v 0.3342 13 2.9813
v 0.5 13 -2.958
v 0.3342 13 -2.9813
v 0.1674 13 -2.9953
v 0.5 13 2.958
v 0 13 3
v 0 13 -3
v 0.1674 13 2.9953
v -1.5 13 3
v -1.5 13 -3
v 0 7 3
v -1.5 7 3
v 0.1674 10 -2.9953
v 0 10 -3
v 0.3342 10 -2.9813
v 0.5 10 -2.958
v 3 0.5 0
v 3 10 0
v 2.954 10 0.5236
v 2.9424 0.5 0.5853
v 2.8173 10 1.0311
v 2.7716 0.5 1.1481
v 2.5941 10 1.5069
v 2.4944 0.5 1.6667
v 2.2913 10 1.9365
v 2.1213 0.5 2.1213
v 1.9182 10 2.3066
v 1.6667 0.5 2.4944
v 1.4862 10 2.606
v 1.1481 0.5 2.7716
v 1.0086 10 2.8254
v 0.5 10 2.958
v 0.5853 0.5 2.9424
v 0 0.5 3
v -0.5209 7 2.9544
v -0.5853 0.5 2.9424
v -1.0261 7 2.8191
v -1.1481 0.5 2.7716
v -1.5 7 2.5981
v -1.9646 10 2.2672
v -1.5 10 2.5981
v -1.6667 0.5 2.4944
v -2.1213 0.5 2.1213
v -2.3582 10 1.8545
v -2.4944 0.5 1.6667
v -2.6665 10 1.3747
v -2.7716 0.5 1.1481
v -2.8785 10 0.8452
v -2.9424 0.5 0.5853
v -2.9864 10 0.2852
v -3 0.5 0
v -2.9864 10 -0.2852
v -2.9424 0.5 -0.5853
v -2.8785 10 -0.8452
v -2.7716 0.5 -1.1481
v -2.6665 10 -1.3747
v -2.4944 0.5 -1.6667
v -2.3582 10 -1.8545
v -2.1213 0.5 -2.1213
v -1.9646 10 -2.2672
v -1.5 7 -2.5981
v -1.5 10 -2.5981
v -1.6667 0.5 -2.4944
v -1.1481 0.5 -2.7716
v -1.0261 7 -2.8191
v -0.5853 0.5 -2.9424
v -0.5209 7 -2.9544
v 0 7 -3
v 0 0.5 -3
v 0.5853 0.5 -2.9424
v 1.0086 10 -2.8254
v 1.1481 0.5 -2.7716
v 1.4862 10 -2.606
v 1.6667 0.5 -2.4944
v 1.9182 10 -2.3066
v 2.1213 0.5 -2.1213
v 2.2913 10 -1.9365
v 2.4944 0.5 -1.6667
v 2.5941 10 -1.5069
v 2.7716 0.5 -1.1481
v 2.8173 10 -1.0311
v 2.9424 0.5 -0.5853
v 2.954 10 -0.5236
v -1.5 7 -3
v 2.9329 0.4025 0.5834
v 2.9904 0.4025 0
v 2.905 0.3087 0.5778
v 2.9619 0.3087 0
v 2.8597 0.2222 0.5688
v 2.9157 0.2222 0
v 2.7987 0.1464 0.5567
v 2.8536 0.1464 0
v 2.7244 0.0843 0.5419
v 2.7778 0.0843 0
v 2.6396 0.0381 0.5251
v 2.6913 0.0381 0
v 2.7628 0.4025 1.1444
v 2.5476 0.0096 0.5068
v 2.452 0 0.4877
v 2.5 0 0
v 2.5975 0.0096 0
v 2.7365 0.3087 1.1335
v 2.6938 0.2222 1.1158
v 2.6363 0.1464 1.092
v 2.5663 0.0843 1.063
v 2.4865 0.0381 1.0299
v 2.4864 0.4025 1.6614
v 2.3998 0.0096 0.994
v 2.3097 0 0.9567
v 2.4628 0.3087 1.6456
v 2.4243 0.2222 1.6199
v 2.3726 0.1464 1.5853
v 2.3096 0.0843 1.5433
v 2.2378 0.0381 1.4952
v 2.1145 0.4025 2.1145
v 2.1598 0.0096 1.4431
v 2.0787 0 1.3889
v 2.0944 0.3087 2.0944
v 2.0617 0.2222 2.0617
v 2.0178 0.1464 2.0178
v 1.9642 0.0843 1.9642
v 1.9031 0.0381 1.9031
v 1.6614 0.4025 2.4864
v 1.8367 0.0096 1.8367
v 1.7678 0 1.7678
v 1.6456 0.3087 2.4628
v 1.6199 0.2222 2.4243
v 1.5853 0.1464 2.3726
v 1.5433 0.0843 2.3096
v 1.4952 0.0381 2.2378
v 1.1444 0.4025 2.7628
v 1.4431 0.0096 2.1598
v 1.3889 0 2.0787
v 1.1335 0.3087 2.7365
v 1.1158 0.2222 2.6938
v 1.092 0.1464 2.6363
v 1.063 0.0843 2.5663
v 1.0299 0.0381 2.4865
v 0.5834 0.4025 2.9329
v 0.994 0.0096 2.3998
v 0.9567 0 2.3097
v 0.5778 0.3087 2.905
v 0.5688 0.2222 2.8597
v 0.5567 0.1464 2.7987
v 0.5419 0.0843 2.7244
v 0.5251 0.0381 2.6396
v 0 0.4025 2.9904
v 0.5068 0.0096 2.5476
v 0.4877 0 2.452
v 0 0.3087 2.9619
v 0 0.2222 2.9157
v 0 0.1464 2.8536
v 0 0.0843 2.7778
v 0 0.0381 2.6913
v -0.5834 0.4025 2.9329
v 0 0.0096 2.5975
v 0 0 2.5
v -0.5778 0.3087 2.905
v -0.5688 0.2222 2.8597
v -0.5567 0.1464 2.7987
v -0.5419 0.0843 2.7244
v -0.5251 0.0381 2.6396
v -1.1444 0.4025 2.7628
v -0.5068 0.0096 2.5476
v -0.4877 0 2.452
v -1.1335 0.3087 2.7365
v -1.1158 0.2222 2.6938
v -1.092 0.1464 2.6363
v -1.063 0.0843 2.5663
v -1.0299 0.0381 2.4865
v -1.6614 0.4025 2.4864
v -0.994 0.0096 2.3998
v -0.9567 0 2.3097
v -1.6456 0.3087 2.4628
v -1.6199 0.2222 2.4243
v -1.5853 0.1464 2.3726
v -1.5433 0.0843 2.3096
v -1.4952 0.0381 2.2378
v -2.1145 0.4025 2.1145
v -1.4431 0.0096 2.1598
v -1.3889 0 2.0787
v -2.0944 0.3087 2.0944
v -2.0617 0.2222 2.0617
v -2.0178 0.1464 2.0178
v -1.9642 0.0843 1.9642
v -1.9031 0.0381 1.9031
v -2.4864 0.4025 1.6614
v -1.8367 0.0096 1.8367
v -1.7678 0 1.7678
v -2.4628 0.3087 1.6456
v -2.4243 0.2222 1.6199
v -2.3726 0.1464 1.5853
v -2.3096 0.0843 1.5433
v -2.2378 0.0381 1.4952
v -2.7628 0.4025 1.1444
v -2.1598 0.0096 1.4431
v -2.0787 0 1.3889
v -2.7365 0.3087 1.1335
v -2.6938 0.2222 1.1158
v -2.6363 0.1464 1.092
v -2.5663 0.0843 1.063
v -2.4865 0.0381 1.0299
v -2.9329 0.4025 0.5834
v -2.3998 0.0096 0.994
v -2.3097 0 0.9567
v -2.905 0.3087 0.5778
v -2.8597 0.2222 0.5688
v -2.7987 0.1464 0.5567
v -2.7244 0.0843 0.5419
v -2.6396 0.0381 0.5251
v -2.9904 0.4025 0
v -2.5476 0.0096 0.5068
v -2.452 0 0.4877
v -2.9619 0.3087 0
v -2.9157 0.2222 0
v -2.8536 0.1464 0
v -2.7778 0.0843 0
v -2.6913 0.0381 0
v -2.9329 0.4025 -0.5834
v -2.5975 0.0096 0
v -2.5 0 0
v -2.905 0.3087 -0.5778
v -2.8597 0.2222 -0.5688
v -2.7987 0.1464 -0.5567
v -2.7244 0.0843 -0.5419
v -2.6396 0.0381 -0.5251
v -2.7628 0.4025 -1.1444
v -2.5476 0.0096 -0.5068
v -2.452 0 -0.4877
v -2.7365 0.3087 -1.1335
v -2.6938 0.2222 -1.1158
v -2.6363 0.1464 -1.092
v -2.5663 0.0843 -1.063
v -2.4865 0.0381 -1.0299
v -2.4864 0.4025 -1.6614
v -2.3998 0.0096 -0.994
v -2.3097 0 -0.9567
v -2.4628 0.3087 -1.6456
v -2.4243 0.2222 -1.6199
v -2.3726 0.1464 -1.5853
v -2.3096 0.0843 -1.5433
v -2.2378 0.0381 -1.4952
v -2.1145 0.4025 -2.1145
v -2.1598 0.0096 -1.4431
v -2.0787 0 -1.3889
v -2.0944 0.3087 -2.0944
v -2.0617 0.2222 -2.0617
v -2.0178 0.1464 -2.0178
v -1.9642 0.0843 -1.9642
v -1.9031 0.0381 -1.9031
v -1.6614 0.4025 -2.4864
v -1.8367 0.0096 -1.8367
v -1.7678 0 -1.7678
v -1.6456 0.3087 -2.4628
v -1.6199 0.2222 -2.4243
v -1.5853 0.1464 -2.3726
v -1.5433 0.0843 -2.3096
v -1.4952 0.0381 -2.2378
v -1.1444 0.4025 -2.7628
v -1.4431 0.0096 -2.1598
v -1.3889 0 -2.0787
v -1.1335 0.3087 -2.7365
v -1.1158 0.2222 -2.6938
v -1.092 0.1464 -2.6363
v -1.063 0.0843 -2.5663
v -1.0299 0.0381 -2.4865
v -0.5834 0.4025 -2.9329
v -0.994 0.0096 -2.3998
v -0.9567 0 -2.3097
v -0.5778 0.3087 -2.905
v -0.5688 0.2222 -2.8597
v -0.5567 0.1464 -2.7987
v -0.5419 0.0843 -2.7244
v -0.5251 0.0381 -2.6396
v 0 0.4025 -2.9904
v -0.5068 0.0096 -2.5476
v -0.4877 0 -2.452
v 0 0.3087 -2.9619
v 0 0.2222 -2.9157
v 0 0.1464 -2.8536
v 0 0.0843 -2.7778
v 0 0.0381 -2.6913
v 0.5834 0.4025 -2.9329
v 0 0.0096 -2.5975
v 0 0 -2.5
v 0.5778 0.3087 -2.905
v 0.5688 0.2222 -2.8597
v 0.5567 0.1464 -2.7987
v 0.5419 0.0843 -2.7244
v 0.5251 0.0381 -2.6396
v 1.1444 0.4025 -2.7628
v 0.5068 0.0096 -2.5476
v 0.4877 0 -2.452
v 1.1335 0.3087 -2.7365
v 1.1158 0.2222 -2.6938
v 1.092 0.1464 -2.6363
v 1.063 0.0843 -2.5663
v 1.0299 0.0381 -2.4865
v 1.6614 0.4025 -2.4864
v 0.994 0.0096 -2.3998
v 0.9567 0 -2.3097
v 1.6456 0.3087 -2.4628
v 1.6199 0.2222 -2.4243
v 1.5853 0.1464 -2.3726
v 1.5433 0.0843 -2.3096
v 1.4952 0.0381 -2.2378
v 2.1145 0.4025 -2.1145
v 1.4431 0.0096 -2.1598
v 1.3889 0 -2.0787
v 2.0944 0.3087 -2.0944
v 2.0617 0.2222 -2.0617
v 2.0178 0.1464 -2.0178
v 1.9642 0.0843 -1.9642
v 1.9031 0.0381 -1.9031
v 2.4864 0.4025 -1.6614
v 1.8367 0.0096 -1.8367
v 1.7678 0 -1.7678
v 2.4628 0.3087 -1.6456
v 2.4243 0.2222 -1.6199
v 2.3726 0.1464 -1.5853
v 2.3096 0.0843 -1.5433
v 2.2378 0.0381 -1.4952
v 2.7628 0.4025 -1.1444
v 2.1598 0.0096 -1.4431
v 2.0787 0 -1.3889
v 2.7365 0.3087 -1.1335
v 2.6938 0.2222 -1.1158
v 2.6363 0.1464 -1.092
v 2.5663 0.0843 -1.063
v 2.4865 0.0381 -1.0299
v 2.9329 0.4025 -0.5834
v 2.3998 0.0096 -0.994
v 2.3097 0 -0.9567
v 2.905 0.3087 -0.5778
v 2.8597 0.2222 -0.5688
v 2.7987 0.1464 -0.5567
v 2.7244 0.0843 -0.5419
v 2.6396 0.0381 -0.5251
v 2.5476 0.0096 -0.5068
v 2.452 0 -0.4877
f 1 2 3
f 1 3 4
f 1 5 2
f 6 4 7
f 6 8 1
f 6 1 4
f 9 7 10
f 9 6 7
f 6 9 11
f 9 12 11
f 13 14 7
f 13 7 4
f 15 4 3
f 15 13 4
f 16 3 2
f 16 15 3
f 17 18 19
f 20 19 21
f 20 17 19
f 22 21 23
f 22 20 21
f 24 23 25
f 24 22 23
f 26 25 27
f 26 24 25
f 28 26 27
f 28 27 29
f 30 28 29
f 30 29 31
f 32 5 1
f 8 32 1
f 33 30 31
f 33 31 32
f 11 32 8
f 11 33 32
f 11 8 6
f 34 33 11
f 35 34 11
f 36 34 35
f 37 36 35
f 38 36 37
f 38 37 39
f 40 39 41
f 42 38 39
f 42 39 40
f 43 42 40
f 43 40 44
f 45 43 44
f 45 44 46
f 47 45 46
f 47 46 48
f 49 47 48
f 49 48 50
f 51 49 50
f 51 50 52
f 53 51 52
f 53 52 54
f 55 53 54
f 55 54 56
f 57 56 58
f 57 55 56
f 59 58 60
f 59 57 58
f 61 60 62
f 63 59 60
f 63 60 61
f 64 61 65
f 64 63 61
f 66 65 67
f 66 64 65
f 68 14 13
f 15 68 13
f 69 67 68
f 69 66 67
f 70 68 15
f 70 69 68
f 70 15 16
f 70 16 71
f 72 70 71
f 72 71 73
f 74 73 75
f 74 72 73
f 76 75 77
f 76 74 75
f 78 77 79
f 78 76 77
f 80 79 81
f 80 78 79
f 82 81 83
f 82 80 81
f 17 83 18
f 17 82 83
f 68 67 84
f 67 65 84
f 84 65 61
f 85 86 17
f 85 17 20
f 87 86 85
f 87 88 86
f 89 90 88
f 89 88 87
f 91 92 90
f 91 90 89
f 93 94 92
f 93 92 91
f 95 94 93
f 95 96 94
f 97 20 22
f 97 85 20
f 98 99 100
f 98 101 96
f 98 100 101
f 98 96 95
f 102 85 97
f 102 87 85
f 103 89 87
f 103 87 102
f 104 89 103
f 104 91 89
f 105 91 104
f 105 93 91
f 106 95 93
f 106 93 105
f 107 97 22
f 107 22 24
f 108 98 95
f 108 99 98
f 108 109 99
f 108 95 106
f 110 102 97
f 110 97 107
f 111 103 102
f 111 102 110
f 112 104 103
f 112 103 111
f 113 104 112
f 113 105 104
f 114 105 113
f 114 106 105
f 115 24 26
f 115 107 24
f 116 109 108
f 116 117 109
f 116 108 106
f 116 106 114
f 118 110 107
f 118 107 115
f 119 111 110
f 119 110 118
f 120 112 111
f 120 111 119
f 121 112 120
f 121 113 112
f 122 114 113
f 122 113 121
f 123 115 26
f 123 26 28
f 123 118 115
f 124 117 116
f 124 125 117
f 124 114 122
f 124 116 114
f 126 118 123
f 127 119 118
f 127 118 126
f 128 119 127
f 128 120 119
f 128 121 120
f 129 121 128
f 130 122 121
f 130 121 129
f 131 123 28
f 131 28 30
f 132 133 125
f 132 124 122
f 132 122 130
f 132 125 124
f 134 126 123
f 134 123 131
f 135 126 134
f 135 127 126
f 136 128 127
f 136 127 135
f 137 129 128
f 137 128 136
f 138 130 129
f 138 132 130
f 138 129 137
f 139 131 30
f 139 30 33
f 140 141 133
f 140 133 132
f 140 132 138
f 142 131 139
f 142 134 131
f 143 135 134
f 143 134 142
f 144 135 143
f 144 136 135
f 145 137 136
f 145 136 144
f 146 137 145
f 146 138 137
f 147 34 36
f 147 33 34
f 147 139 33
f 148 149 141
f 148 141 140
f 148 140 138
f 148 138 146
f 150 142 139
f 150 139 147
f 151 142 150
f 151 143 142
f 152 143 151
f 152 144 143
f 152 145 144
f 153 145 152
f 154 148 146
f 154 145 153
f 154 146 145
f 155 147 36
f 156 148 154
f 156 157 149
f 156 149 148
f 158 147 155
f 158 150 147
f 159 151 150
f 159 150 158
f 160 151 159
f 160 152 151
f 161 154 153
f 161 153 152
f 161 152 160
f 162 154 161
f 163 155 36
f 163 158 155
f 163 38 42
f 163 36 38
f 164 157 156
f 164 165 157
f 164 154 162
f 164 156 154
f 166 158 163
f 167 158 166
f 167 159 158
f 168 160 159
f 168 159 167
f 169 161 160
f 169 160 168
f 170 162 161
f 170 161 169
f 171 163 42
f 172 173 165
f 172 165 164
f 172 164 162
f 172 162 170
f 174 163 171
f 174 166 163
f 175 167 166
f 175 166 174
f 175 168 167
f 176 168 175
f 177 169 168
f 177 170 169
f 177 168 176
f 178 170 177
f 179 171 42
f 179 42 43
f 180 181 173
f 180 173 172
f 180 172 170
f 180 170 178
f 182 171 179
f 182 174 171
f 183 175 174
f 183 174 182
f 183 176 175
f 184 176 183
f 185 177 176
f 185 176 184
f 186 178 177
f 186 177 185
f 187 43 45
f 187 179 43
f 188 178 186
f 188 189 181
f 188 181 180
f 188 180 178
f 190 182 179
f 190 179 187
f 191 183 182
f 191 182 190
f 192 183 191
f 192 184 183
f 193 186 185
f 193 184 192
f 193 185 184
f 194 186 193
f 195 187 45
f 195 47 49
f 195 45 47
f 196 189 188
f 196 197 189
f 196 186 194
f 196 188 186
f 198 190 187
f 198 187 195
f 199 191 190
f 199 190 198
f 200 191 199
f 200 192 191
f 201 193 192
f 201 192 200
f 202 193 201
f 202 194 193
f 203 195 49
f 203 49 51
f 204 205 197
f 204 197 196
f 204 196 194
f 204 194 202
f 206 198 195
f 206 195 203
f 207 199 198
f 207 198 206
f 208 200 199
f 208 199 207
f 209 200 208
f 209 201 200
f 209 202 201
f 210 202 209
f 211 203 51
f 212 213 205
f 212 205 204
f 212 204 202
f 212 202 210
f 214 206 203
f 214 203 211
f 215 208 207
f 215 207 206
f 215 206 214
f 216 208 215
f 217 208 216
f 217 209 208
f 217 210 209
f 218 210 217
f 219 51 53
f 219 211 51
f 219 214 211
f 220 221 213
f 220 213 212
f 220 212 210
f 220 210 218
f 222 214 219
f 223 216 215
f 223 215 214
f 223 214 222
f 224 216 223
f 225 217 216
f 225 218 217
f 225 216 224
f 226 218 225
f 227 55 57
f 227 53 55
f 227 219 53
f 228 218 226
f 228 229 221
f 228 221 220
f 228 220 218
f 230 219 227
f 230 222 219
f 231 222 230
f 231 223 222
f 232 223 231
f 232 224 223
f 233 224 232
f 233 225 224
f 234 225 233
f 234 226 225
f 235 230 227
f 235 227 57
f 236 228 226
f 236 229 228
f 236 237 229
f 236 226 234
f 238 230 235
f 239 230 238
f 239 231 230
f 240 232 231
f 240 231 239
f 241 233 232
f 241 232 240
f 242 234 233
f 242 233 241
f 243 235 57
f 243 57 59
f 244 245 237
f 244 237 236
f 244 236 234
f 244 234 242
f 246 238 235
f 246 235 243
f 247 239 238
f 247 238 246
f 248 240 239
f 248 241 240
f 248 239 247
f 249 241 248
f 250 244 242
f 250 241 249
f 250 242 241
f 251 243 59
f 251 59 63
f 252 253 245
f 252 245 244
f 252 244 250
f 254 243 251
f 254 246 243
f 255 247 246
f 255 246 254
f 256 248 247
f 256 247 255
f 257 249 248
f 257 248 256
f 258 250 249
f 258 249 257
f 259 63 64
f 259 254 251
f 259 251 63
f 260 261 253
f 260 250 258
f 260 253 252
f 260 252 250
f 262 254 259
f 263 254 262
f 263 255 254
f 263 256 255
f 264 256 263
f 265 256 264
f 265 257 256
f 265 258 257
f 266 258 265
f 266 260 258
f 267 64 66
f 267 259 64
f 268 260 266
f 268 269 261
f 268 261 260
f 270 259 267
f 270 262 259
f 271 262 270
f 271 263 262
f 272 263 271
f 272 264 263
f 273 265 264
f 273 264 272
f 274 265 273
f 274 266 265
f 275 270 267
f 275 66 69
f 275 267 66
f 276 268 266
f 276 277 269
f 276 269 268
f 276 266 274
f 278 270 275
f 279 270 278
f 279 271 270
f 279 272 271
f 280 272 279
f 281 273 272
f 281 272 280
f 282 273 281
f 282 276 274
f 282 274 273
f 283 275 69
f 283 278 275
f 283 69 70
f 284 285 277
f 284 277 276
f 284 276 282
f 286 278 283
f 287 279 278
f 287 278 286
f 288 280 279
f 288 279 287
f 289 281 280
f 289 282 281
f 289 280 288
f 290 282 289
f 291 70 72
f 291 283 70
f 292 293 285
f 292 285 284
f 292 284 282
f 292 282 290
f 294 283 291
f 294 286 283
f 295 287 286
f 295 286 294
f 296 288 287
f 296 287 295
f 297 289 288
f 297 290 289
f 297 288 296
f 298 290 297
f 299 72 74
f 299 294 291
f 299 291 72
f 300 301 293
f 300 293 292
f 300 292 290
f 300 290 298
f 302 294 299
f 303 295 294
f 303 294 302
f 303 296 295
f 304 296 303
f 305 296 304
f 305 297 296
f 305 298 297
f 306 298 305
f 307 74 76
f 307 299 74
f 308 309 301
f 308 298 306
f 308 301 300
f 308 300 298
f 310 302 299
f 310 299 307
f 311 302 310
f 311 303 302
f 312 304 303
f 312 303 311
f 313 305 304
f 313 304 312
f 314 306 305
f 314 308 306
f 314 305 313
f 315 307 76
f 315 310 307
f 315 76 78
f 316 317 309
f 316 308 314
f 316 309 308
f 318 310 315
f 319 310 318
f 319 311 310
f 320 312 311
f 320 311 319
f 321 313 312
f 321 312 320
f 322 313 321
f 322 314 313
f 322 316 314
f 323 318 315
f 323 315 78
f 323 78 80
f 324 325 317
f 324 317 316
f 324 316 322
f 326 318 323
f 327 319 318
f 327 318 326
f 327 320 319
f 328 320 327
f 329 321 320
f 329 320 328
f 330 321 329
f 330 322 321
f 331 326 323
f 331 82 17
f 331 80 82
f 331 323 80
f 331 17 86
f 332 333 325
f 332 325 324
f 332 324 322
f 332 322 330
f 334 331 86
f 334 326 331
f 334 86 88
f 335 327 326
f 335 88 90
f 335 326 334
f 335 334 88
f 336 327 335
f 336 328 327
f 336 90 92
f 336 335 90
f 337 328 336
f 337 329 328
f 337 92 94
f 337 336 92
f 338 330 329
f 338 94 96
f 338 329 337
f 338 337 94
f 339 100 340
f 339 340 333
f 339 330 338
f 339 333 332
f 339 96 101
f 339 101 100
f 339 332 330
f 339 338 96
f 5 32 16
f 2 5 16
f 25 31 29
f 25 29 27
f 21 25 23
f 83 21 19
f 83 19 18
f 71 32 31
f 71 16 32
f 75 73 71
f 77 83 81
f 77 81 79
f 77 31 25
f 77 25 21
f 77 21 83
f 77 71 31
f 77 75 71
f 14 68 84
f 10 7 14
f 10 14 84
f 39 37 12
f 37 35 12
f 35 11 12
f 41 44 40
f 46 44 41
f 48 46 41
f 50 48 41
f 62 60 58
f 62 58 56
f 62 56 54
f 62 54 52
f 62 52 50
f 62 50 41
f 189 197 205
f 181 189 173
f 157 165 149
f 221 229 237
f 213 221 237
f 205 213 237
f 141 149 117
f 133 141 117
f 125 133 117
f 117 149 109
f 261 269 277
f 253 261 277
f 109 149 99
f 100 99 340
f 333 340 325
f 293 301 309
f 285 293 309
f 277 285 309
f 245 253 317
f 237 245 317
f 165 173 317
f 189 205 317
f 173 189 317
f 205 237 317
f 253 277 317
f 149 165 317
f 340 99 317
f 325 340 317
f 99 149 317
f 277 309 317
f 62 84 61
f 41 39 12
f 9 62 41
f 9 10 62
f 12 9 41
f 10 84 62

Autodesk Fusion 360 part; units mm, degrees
sketch "Sketch1" plane through (0, 0, 0) normal (0, 1, 0) x (1, 0, 0)
  circle A0 centre (0, 0) radius 3
  dimension "d1" = 6
extrude "Extrude1" add sketch "Sketch1" along normal blind 10
sketch "Sketch2" plane through (0, 10, 0) normal (0, 1, 0) x (-1, 0, 0)
  circle A0 centre (0, 0) radius 3
  line L0 (0, 0) -> (-3, 0) construction
  line L1 (-3, 0) -> (-0.5, 0)
  line L2 (-0.5, 0) -> (1.5, 0)
  line L3 (1.5, 0) -> (3, 0)
  line L4 (1.5, 3) -> (-0.5, 3)
  line L5 (-0.5, 3) -> (-0.5, -3)
  line L6 (-0.5, -3) -> (1.5, -3)
  line L7 (1.5, -3) -> (1.5, 3)
  line L8 (1.5, 3) -> (-0.5, -3) construction
  line L9 (-0.5, 3) -> (1.5, -3) construction
  point P0 (0.5, 0)
  dimension "d4" = 2.5
  dimension "d5" = 2
  dimension "d6" = 2
  dimension "d7" = 6
extrude "Extrude2" add sketch "Sketch2" along normal blind 3 contours A0 L2 L5 L7 | A0 L4 L7 | A0 L6 L7 | A0 L2 L5 L7
extrude "Extrude3" add 2 faces at (-1.3827, 10, 2.7899) (-1.3827, 10, -2.7899) along direction (0, -1, 0) blind 3
fillet "Fillet1" radius 0.5 1 edges at (-2.797, 0, 1.0848)
